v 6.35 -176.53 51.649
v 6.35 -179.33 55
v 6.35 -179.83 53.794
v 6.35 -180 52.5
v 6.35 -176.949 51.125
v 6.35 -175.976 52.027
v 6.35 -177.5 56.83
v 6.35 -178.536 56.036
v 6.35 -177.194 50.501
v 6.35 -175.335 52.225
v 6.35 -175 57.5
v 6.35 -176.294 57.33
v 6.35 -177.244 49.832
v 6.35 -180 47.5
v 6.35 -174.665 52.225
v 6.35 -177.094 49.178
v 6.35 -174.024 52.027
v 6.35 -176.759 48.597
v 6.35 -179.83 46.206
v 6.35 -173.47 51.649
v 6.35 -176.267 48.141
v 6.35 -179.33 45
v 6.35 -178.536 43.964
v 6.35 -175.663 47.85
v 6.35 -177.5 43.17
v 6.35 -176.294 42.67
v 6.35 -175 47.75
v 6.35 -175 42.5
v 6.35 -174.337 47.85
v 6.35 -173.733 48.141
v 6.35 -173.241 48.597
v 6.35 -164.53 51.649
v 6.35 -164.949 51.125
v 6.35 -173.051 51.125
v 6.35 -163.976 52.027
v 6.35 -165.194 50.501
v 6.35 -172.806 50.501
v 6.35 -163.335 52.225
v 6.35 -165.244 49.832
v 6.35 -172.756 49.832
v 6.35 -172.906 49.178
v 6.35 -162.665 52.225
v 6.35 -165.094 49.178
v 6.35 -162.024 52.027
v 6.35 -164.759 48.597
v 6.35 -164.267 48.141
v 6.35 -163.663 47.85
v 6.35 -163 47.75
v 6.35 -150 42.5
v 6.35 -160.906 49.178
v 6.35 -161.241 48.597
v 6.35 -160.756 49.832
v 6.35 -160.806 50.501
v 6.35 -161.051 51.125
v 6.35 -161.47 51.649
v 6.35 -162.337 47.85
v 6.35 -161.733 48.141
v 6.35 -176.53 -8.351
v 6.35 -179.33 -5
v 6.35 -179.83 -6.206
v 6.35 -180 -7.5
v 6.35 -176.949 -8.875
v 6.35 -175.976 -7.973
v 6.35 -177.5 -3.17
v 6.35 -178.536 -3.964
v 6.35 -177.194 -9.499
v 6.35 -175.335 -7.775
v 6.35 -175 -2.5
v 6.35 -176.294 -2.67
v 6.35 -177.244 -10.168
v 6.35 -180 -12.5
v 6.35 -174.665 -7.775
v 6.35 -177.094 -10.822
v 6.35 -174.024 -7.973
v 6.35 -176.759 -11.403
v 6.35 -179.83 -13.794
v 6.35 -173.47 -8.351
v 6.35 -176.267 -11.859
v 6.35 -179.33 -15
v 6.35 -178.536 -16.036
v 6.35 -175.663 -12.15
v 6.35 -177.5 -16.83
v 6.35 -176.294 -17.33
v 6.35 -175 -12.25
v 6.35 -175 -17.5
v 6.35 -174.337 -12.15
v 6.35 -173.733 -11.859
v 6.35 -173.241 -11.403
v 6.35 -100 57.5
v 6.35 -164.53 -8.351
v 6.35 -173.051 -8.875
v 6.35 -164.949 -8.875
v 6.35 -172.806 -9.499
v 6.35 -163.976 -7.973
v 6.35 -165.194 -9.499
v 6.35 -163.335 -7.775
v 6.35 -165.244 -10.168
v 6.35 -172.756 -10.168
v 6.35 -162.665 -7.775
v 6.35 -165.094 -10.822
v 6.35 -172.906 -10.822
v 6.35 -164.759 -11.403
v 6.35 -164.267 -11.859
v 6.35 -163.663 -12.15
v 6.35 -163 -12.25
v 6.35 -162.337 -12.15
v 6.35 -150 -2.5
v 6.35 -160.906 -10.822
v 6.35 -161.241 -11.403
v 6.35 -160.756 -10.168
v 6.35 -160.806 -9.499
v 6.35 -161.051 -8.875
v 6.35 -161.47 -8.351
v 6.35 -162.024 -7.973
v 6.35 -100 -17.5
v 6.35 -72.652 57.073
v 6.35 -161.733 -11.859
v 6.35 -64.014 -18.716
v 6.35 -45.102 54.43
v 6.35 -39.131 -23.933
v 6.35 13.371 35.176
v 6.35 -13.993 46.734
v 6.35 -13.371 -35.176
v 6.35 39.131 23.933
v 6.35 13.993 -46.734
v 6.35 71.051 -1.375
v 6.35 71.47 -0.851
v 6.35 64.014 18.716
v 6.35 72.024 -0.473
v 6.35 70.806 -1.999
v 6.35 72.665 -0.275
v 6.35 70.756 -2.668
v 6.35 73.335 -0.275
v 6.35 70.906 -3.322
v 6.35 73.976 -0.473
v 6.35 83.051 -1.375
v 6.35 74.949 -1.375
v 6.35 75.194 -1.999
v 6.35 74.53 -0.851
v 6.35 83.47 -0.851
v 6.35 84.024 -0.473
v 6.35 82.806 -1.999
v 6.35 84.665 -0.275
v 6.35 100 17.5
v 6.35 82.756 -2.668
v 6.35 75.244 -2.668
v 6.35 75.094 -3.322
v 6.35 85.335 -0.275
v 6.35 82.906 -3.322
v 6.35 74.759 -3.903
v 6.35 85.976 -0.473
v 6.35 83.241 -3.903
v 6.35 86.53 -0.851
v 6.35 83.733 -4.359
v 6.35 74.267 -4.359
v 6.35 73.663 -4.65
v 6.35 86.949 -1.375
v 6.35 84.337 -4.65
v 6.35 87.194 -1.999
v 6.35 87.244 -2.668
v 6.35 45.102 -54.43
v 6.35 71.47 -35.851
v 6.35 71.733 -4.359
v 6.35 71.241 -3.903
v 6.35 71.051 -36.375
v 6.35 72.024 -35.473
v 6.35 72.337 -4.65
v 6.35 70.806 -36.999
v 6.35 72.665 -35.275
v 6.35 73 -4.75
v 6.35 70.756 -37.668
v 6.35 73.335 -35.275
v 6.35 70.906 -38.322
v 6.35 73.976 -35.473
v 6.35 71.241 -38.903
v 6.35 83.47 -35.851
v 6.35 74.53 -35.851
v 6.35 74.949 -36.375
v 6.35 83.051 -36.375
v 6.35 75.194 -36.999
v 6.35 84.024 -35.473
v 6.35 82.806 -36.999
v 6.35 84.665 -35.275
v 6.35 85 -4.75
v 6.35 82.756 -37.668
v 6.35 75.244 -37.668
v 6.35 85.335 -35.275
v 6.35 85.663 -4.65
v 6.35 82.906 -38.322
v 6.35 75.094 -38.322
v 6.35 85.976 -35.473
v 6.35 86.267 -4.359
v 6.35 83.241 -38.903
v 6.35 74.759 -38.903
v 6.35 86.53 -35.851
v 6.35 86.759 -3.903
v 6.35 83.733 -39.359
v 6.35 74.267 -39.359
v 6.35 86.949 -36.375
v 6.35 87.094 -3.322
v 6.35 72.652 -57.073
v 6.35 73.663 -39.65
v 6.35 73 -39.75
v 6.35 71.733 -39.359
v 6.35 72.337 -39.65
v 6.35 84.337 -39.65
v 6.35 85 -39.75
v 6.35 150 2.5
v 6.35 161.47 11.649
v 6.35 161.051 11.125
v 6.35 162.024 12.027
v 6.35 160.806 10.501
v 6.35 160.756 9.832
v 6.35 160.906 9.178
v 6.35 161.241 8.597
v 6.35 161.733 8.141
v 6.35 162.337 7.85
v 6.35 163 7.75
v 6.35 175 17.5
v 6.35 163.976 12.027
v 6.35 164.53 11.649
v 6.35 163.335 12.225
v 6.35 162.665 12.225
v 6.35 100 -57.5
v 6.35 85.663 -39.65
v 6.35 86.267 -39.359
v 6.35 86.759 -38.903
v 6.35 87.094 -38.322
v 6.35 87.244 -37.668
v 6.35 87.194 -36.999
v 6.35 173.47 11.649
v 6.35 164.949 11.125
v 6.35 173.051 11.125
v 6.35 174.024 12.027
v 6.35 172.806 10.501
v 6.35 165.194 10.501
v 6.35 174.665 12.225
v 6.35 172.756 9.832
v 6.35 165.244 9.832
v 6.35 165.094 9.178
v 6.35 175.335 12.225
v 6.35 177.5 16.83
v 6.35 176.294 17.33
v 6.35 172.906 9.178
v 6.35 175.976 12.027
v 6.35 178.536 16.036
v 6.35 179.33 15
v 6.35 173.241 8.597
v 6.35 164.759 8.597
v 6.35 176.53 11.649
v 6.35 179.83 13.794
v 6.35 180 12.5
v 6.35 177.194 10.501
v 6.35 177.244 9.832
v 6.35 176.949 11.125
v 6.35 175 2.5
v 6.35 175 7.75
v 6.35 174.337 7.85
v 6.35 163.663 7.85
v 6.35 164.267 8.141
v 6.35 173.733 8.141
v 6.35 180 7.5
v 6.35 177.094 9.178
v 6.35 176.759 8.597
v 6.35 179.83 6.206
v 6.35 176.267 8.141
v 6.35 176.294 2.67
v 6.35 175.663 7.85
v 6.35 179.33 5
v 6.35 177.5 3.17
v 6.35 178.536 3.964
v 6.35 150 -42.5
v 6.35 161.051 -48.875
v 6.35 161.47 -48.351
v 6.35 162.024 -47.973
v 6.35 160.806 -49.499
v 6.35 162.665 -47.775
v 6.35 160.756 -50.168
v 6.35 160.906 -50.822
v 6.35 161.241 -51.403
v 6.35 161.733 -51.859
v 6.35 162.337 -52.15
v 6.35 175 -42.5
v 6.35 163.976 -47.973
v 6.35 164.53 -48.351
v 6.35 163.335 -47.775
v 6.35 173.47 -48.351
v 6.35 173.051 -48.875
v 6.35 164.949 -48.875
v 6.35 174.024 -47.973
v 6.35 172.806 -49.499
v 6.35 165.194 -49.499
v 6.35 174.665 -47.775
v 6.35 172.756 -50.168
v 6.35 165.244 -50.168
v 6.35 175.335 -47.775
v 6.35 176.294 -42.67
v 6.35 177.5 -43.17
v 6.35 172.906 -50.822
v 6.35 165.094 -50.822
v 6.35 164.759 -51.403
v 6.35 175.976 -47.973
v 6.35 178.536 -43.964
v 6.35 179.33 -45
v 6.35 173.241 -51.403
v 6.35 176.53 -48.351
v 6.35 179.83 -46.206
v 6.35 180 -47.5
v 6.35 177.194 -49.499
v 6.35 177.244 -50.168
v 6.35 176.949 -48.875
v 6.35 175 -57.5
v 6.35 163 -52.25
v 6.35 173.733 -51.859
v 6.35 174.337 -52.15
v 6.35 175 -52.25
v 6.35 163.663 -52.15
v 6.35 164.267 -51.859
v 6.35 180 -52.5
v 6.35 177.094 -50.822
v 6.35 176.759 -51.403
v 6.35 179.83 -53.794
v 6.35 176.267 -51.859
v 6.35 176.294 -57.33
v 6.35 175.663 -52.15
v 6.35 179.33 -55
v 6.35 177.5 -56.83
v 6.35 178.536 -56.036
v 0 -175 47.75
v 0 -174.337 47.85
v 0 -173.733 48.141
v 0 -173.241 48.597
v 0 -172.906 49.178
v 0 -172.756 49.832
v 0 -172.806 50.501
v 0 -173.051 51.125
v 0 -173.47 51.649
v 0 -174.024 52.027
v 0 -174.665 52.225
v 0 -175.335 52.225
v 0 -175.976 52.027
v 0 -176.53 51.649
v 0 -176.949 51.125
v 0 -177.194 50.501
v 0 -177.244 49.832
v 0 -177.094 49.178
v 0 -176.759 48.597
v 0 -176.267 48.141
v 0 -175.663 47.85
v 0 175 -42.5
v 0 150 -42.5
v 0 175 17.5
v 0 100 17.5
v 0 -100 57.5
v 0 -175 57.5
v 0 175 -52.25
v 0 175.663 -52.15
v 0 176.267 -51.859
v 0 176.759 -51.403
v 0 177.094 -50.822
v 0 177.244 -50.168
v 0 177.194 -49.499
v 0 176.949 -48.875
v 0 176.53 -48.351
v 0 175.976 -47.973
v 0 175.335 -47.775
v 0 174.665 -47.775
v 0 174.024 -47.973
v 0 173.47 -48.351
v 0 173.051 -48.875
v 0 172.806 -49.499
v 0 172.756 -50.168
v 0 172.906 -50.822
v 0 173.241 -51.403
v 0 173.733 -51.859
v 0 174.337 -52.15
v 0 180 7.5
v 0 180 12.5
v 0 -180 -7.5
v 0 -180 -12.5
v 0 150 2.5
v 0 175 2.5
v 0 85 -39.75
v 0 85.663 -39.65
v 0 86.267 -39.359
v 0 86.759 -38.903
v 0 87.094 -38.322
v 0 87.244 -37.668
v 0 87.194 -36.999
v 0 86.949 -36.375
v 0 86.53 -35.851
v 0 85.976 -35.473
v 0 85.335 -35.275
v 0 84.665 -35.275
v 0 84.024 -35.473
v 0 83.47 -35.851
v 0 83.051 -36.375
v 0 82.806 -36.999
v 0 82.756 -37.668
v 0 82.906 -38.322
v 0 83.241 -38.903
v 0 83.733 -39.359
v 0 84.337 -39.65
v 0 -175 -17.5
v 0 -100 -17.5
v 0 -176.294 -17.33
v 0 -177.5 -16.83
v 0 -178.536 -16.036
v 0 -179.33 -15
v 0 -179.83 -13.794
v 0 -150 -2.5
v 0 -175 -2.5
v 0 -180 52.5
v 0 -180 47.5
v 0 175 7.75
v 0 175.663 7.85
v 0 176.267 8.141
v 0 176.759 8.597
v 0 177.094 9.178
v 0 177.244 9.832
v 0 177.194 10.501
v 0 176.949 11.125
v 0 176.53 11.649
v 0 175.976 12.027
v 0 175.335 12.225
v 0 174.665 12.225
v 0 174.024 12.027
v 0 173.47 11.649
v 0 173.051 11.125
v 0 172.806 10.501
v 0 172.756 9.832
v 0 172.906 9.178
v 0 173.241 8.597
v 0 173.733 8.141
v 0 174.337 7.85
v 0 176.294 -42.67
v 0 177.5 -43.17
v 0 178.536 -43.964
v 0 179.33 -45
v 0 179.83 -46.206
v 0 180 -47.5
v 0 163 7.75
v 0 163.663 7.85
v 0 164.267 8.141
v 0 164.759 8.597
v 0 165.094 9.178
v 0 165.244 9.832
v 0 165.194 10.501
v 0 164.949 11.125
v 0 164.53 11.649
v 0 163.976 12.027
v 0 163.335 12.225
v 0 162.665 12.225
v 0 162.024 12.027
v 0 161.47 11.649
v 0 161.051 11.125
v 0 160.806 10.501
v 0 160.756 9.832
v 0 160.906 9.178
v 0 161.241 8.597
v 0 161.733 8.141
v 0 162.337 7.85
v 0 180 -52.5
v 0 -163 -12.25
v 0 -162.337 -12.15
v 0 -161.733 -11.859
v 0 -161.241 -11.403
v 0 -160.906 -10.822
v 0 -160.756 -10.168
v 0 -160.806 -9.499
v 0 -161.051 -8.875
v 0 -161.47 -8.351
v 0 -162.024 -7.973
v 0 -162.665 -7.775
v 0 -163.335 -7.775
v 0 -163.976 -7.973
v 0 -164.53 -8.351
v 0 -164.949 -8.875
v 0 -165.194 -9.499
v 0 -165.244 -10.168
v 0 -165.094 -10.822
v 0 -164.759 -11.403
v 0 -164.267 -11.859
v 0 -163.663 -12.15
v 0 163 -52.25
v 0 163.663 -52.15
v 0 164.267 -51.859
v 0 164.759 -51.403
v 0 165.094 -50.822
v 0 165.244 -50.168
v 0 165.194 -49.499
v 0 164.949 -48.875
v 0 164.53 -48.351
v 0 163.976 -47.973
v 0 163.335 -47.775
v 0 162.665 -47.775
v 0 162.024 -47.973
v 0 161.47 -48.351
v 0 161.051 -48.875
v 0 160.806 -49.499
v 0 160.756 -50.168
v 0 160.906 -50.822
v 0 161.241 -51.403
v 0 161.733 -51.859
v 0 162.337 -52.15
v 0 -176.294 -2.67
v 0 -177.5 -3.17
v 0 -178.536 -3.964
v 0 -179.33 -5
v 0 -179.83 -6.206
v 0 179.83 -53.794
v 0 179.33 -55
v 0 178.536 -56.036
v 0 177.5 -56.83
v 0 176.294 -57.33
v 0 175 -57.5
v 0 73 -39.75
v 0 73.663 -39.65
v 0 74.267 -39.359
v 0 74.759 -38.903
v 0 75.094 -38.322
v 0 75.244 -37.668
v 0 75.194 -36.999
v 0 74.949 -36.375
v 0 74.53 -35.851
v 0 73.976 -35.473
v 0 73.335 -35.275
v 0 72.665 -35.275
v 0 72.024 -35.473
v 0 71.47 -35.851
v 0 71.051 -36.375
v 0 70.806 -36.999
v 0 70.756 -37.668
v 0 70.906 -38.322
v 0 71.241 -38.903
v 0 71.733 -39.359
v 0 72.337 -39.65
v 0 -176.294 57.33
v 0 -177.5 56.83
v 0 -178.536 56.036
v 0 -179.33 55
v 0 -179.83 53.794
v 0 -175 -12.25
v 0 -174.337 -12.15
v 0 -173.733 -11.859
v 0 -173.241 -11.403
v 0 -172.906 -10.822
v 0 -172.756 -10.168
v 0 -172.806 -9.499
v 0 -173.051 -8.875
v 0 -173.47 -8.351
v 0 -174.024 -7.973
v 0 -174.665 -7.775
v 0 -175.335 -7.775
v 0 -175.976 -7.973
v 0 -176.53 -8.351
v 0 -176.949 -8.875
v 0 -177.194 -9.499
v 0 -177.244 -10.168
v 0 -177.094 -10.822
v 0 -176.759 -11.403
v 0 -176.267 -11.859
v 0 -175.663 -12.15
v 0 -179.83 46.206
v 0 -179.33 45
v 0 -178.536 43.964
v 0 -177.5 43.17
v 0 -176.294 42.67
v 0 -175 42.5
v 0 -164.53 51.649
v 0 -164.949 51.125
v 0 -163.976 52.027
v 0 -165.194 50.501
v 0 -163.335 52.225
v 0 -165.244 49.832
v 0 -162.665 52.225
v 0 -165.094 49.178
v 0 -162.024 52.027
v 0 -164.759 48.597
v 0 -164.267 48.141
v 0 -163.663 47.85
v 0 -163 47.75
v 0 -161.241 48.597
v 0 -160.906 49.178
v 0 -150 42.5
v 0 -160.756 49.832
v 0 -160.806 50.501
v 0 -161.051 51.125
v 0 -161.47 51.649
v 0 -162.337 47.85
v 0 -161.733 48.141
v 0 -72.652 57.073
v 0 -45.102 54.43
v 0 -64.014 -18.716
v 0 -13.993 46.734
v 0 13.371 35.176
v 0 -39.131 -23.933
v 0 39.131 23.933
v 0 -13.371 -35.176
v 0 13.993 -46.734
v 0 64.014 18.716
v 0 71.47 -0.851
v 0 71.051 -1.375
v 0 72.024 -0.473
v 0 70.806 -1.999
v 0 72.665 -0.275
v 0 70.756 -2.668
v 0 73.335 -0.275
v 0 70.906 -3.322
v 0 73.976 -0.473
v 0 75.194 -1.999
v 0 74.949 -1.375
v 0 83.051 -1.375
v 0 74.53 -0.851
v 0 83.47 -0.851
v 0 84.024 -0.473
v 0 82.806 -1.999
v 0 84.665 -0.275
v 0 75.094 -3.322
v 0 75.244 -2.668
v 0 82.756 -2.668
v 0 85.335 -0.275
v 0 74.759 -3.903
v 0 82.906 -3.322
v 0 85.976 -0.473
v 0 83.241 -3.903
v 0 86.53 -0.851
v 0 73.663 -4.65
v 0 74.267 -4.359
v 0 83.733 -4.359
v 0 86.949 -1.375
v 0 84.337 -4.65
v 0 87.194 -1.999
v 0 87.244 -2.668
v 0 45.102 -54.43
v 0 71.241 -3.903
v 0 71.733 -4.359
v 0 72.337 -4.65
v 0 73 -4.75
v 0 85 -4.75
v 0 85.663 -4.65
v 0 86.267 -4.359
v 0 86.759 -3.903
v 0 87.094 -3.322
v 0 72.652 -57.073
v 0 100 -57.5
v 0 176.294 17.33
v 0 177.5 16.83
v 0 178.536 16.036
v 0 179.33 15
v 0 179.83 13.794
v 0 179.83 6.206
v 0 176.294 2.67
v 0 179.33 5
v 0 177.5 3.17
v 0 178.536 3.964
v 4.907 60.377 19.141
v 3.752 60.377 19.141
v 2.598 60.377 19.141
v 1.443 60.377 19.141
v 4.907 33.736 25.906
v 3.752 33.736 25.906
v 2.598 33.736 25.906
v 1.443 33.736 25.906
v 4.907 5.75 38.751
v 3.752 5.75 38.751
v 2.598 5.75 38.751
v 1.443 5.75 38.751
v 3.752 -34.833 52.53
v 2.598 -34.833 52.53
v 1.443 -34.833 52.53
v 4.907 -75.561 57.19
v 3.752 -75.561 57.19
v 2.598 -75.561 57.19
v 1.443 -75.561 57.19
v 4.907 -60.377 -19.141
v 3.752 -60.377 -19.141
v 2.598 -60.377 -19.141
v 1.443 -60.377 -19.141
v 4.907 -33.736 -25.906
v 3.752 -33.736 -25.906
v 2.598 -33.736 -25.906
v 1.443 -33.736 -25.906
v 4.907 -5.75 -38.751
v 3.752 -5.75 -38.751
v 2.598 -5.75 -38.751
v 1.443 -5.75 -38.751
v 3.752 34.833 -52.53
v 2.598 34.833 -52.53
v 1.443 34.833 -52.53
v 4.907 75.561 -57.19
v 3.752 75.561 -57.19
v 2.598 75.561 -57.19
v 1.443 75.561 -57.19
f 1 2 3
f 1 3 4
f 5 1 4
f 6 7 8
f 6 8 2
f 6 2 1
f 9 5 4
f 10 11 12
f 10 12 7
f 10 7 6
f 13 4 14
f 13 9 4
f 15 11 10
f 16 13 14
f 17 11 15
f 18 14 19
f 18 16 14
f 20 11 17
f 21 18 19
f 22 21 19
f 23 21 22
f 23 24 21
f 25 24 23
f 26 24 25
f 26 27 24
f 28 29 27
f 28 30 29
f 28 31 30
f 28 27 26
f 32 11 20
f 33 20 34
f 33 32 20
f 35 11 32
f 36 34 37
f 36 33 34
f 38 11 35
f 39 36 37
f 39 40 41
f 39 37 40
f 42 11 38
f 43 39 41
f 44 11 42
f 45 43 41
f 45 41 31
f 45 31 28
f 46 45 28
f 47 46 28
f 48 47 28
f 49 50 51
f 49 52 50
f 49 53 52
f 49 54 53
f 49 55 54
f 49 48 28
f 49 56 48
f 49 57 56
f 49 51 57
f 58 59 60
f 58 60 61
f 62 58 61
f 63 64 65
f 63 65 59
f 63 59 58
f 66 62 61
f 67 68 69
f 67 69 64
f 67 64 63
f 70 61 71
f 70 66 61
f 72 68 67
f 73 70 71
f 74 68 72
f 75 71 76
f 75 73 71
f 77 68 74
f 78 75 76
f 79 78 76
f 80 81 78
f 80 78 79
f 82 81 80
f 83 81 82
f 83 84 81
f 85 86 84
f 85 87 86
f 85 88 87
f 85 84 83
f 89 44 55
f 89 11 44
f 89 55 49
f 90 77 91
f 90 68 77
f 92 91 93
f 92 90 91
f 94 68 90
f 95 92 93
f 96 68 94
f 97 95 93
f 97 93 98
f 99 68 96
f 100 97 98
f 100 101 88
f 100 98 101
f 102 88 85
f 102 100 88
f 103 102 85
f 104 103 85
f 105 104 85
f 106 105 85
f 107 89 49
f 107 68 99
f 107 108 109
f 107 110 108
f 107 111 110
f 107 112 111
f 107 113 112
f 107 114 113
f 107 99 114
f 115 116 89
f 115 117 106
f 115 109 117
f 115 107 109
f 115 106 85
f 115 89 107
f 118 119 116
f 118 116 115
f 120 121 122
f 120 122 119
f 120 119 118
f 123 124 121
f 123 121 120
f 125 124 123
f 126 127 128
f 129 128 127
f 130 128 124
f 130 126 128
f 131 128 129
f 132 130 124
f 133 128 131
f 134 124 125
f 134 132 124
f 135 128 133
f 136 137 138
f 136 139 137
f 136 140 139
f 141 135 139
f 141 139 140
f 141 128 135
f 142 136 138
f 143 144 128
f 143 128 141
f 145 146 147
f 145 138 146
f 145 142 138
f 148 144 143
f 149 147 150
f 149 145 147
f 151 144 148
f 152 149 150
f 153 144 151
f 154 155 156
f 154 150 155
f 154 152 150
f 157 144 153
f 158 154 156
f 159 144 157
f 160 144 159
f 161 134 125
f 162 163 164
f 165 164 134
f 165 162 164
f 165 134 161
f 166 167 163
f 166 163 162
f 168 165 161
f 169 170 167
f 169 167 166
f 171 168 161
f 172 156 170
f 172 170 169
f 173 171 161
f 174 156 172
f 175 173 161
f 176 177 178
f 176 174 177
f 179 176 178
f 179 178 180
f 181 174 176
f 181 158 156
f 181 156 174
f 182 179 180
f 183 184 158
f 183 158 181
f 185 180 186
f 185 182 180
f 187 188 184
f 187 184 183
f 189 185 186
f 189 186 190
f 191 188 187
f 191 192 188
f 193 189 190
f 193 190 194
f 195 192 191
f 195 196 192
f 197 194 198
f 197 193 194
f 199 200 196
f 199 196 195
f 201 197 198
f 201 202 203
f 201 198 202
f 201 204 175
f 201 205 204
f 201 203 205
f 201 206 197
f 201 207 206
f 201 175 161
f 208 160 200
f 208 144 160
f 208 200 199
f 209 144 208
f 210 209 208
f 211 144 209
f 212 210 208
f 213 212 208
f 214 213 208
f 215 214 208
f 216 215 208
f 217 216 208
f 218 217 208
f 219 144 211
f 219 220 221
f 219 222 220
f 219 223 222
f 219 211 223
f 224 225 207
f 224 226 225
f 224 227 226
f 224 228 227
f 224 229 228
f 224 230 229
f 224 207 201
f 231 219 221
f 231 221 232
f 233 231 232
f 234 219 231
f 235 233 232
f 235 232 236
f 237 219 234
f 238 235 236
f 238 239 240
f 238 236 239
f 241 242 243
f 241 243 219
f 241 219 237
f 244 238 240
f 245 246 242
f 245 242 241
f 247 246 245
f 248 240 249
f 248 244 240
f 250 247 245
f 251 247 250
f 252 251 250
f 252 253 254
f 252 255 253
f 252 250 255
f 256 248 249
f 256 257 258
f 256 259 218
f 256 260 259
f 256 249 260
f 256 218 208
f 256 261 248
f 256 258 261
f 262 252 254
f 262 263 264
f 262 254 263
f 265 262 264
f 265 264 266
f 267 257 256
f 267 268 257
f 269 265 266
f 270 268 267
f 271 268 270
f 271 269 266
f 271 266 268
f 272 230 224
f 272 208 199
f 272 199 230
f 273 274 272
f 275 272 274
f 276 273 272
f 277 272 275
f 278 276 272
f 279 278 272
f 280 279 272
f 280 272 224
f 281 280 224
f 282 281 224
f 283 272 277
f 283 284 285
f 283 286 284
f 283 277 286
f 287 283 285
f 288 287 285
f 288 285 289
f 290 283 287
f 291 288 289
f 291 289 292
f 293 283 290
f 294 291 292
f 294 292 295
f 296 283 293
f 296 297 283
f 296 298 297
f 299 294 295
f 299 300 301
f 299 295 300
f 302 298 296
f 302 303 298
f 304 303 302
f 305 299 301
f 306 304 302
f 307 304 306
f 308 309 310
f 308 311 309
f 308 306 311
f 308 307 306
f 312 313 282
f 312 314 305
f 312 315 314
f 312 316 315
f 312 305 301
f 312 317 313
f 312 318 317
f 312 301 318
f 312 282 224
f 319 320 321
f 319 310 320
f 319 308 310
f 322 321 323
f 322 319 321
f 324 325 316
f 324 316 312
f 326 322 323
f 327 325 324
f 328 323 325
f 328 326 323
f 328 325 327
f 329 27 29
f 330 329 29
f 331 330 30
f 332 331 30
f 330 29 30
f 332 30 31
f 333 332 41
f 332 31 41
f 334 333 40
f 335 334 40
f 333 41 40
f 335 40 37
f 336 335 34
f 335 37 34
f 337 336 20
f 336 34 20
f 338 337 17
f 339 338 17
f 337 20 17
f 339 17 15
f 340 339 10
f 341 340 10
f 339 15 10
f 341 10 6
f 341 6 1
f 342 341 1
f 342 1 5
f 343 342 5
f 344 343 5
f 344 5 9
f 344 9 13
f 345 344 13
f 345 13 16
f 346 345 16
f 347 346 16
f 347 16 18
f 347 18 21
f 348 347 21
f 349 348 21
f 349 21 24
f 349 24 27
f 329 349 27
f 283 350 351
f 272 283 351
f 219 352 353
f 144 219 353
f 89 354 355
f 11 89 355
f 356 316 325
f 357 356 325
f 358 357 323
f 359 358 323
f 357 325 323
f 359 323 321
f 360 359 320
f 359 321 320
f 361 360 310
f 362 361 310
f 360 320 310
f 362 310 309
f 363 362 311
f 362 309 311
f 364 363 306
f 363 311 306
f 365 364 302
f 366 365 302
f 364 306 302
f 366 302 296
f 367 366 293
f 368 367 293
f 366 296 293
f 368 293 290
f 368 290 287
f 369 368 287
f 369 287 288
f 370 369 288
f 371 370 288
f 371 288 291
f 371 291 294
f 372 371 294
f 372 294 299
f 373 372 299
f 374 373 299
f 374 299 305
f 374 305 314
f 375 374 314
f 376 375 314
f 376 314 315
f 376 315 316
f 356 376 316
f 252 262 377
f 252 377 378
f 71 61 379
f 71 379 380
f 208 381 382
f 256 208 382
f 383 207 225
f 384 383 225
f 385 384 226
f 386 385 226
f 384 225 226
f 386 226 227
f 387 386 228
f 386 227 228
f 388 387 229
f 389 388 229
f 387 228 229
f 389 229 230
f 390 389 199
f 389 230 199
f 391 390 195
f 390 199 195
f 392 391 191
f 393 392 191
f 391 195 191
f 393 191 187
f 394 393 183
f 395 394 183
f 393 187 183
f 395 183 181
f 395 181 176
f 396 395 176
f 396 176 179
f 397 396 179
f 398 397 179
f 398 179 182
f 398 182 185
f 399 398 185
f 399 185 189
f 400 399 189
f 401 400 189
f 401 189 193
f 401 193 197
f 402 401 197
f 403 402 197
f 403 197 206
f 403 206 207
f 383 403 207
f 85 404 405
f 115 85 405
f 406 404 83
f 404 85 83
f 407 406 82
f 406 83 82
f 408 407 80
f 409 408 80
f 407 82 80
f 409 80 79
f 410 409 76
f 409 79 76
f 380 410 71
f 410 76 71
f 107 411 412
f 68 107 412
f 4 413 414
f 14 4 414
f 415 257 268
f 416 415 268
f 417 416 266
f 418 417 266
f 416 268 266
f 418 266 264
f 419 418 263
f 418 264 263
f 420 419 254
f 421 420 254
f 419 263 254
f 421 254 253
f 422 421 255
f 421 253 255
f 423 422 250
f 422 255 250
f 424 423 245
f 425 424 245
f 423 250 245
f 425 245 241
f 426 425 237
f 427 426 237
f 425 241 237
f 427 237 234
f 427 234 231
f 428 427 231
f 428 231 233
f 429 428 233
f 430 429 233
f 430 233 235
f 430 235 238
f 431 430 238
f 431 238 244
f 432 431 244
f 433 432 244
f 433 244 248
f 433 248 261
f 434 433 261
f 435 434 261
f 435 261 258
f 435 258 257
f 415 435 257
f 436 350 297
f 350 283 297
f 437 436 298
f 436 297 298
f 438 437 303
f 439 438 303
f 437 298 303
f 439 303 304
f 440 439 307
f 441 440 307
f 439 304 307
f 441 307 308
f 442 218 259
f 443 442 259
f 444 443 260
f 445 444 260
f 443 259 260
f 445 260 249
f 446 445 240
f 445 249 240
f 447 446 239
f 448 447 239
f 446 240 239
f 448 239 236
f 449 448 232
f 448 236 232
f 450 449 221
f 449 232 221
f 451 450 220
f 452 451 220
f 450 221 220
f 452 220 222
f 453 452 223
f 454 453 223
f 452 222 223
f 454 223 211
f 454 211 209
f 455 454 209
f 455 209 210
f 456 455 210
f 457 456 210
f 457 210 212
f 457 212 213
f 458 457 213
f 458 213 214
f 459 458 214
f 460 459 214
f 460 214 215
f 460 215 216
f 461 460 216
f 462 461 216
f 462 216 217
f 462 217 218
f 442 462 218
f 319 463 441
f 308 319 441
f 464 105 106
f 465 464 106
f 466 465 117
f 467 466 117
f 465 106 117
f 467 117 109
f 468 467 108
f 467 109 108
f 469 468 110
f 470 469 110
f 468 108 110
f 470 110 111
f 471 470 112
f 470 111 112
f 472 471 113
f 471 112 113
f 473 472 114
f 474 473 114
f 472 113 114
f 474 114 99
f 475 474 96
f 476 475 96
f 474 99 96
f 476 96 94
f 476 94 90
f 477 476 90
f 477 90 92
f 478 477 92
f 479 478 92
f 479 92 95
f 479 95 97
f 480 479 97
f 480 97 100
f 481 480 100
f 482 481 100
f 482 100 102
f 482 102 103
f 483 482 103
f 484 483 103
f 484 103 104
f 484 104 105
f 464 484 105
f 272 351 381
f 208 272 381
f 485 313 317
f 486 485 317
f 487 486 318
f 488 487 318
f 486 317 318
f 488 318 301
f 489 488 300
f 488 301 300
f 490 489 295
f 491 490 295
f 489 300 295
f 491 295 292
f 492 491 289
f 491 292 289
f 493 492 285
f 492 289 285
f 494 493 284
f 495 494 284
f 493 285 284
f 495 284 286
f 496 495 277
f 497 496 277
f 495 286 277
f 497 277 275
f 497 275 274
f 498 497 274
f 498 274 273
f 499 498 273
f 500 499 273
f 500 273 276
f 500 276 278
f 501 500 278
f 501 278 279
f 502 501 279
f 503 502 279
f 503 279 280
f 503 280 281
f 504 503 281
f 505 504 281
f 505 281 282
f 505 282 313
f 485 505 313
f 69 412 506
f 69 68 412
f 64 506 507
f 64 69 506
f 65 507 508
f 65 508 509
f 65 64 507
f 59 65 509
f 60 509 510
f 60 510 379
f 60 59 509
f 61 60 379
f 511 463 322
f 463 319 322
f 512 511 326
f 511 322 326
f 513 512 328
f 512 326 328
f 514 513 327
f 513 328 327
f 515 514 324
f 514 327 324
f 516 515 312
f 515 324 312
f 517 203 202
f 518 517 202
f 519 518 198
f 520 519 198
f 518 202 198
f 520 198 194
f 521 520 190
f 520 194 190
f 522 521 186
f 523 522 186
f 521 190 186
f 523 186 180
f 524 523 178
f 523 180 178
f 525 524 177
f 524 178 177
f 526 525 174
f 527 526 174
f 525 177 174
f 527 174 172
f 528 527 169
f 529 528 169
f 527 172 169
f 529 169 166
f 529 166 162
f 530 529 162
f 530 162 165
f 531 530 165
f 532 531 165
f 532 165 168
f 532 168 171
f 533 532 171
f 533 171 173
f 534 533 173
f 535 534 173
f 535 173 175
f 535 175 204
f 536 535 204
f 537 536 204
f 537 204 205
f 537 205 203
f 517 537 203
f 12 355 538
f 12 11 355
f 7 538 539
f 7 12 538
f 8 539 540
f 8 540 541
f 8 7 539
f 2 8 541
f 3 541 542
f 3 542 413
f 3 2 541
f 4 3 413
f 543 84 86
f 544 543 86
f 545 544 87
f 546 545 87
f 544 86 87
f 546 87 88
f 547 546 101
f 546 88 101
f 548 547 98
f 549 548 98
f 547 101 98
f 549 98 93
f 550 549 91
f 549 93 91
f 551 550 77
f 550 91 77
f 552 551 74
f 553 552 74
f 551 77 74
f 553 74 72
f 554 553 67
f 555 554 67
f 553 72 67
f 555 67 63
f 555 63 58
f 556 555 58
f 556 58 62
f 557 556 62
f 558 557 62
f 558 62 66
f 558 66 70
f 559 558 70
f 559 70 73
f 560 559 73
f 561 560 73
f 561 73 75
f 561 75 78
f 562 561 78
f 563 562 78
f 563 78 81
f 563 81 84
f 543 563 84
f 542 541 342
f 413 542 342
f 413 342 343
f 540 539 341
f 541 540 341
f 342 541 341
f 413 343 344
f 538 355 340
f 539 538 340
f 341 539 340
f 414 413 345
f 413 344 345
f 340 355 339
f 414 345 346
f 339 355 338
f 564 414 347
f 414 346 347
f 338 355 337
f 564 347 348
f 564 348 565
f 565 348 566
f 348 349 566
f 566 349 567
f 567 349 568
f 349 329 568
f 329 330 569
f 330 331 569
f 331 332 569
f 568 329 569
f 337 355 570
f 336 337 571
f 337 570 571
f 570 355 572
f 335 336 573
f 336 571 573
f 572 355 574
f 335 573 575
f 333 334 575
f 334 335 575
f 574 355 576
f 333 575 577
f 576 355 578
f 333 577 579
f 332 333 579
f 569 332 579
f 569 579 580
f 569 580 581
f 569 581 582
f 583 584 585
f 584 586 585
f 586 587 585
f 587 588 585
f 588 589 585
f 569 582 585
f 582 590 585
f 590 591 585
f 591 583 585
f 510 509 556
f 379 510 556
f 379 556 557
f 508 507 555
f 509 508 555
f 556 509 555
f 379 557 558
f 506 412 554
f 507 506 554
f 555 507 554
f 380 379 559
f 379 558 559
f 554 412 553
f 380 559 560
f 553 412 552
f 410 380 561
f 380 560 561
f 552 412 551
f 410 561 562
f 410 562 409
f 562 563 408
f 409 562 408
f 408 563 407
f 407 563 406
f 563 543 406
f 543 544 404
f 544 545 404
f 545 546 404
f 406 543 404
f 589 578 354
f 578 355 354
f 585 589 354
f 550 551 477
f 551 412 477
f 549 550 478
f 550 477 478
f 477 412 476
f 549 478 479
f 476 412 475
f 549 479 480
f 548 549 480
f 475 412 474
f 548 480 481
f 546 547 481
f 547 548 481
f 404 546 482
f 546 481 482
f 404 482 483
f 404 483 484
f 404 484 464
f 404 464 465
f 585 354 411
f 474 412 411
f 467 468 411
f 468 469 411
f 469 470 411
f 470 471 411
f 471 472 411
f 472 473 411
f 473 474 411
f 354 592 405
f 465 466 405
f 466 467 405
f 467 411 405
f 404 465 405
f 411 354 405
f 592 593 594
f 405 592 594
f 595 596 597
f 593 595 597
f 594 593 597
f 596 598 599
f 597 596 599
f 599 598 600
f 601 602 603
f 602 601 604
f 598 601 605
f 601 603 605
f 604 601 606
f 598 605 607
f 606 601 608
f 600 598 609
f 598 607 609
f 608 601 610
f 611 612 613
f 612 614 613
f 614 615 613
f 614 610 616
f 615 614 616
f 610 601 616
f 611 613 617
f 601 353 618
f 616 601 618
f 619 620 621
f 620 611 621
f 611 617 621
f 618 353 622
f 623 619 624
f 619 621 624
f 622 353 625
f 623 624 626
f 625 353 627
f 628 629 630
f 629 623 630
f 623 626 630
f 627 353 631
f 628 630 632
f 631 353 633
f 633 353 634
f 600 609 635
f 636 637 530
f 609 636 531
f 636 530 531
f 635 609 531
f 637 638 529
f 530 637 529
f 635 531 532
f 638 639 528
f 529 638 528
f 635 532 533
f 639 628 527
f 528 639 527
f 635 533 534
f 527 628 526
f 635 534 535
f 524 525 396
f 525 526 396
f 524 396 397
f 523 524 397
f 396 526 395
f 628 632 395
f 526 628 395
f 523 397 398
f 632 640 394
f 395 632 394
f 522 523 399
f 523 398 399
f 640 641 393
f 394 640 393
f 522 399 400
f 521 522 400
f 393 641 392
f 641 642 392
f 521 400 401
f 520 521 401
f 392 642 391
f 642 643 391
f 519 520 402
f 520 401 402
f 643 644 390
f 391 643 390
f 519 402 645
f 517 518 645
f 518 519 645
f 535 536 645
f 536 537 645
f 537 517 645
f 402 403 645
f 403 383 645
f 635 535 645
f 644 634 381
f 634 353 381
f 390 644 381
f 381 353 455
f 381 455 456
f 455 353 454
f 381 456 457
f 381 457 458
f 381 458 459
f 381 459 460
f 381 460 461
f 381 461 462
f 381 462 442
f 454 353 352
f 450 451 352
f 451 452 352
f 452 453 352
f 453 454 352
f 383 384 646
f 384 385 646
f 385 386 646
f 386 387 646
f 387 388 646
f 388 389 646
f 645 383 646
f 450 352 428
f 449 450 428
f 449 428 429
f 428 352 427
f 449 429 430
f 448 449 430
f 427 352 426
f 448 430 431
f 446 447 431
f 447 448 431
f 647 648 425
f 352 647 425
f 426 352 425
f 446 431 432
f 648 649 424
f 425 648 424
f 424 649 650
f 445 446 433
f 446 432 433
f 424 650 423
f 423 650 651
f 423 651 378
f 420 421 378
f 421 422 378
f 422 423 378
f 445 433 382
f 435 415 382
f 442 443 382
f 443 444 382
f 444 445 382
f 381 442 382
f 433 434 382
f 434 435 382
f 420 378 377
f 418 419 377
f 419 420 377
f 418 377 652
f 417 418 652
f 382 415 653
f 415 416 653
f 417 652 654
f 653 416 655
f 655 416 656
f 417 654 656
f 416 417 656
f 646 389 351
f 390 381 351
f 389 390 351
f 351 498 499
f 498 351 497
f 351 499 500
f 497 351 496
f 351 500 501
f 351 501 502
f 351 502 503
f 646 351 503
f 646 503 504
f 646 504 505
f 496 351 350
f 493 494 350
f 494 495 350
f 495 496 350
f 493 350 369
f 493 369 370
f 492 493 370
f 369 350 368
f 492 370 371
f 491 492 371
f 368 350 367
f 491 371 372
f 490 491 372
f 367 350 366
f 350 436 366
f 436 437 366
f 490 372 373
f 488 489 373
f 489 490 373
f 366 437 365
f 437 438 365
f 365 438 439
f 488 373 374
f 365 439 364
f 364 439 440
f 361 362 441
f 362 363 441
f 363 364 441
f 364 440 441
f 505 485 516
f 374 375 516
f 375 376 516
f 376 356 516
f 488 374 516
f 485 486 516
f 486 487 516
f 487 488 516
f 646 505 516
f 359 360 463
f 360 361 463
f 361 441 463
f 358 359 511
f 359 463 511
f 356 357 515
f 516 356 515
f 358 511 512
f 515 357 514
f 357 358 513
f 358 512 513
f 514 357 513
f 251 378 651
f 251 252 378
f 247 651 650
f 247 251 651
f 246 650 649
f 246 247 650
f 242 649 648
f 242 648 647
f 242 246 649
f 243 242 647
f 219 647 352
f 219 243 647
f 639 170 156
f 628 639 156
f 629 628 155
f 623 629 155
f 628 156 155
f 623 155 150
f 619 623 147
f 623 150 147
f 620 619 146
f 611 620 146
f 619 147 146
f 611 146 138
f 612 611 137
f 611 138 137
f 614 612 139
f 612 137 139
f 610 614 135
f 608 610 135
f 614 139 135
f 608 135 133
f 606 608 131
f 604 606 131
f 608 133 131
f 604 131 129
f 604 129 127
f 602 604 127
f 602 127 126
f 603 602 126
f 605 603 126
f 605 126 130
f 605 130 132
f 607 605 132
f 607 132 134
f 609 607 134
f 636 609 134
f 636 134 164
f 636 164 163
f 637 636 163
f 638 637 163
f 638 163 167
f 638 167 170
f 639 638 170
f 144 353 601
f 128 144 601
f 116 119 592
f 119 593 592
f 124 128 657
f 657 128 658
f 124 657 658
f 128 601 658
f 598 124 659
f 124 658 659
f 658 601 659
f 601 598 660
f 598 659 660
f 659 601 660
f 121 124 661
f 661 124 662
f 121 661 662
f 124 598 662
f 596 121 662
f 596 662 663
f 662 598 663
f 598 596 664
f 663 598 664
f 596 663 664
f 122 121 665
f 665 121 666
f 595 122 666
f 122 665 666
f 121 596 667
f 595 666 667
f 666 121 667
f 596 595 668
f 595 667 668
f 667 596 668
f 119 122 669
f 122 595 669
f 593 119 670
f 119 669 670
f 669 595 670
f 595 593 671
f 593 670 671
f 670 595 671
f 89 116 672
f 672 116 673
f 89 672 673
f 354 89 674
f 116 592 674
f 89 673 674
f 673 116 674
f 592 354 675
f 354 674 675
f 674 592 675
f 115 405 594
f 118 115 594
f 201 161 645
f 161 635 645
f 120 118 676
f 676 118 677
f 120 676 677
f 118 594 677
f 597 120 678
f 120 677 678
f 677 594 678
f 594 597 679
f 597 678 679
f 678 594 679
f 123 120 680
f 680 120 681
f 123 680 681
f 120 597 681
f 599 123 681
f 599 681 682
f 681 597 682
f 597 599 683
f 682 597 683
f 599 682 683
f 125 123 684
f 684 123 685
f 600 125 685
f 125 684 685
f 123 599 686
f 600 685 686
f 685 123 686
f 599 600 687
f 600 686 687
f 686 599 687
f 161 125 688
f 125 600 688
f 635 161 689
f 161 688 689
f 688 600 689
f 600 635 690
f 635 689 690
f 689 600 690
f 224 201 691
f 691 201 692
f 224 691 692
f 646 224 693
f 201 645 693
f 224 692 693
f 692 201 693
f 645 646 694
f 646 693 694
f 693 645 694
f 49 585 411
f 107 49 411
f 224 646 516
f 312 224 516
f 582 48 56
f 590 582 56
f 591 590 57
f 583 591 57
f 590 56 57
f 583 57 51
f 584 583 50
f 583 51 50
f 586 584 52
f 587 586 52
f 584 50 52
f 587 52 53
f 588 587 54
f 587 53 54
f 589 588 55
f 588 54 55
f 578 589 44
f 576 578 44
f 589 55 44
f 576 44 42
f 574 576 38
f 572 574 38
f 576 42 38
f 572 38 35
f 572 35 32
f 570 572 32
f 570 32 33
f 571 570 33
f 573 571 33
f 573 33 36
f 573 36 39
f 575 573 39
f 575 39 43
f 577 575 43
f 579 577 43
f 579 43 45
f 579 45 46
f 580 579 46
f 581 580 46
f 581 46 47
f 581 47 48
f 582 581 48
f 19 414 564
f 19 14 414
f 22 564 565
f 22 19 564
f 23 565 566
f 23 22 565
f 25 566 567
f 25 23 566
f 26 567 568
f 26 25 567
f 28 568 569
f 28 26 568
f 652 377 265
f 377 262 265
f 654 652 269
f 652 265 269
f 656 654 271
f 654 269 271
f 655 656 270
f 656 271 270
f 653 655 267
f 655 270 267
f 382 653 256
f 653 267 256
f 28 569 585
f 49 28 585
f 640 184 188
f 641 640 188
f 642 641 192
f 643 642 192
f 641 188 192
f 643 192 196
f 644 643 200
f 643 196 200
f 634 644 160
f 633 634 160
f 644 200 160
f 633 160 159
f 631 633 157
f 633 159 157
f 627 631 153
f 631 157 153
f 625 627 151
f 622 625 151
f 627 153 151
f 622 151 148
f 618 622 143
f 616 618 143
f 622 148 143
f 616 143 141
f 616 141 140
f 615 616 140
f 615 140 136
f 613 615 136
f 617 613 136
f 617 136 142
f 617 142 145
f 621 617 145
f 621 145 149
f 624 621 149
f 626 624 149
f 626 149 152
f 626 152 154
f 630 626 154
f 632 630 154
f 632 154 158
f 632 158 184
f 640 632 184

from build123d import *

# Parameters (mm, degrees)
SALIENTE_EXTRUIR1_DEPTH      = 6.35
TALADRO_DE_MARGEN_PARA_M41_D = 4.5
REDONDEO1_R                  = 5


# Read off the part's stored shape, not the designer's step: Saliente-Extruir1
with BuildPart() as part:
    # Saliente-Extruir1 outline → Saliente-Extruir1 (new body)
    with BuildSketch(Plane(origin=(0, 0, 0), x_dir=(0, 0, -1), z_dir=(1, 0, 0))):
        with BuildLine():
            Line((-2.5, 180), (-17.5, 180))
            Line((-17.5, 180), (-17.5, 100))
            add(Edge.make_bspline(
                [(-17.5, 100), (-17.5, 98.712751966), (-17.500047788, 96.116321069), (-17.51148981, 91.098940131), (-17.565479393, 85.046877218), (-17.737925717, 78.203948852), (-18.147729277, 69.656133307), (-19.038911227, 60.095322328), (-20.718334539, 50.310614009), (-22.956153632, 41.771686415), (-25.785586207, 33.773608765), (-29.338865081, 25.548124026), (-33.697565336, 16.449967912), (-38.713561507, 6.016494532), (-43.953609584, -6.016361906), (-48.809754323, -19.661313126), (-52.733015331, -34.671033487), (-55.439087369, -50.654463146), (-56.694005293, -64.452671708), (-57.222054598, -75.565918854), (-57.428472519, -83.87427142), (-57.487938926, -90.701655992), (-57.499988878, -96.070691027), (-57.5, -98.684323127), (-57.5, -100)],
                knots=[0, 0, 0, 0, 0.015625, 0.03125, 0.0625, 0.09375, 0.125, 0.1875, 0.25, 0.3125, 0.375, 0.4375, 0.5, 0.5625, 0.625, 0.6875, 0.75, 0.8125, 0.875, 0.90625, 0.9375, 0.96875, 0.984375, 1, 1, 1, 1], degree=3))
            Line((-57.5, -100), (-57.5, -180))
            Line((-57.5, -180), (-42.5, -180))
            Line((-42.5, -180), (-42.5, -150))
            Line((-42.5, -150), (2.5, -150))
            Line((2.5, -150), (2.5, -180))
            Line((2.5, -180), (17.5, -180))
            Line((17.5, -180), (17.5, -100))
            add(Edge.make_bspline(
                [(17.5, -100), (17.5, -98.712751966), (17.500047788, -96.116321069), (17.51148981, -91.098940131), (17.565479393, -85.046877218), (17.737925717, -78.203948852), (18.147729277, -69.656133307), (19.038911227, -60.095322328), (20.718334539, -50.310614009), (22.956153632, -41.771686415), (25.785586207, -33.773608765), (29.338865081, -25.548124026), (33.697565336, -16.449967912), (38.713561507, -6.016494532), (43.953609584, 6.016361906), (48.809754323, 19.661313126), (52.733015331, 34.671033487), (55.439087369, 50.654463146), (56.694005293, 64.452671708), (57.222054598, 75.565918854), (57.428472519, 83.87427142), (57.487938926, 90.701655992), (57.499988878, 96.070691027), (57.5, 98.684323127), (57.5, 100)],
                knots=[0, 0, 0, 0, 0.015625, 0.03125, 0.0625, 0.09375, 0.125, 0.1875, 0.25, 0.3125, 0.375, 0.4375, 0.5, 0.5625, 0.625, 0.6875, 0.75, 0.8125, 0.875, 0.90625, 0.9375, 0.96875, 0.984375, 1, 1, 1, 1], degree=3))
            Line((57.5, 100), (57.5, 180))
            Line((57.5, 180), (42.5, 180))
            Line((42.5, 180), (42.5, 150))
            Line((42.5, 150), (-2.5, 150))
            Line((-2.5, 150), (-2.5, 180))
        make_face()
    extrude(amount=SALIENTE_EXTRUIR1_DEPTH)

    # Taladro de margen para M41 (through all)
    with Locations(Plane.ZY):
        with Locations((10, 163), (10, 175), (-50, 163), (-50, 175), (50, -175), (50, -163), (-10, -175), (-10, -163), (-2.5, 85), (-2.5, 73), (-37.5, 73), (-37.5, 85)):
            Hole(TALADRO_DE_MARGEN_PARA_M41_D / 2)

    # Redondeo1
    redondeo1_edges = [part.edges().sort_by_distance(p)[0] for p in [
        (3.175, 180, 2.5),
        (3.175, 180, -42.5),
        (3.175, 180, -57.5),
        (3.175, -180, -17.5),
        (3.175, -180, -2.5),
        (3.175, -180, 42.5),
        (3.175, -180, 57.5),
        (3.175, 180, 17.5),
    ]]
    fillet(redondeo1_edges, radius=REDONDEO1_R)


solid = part.part
